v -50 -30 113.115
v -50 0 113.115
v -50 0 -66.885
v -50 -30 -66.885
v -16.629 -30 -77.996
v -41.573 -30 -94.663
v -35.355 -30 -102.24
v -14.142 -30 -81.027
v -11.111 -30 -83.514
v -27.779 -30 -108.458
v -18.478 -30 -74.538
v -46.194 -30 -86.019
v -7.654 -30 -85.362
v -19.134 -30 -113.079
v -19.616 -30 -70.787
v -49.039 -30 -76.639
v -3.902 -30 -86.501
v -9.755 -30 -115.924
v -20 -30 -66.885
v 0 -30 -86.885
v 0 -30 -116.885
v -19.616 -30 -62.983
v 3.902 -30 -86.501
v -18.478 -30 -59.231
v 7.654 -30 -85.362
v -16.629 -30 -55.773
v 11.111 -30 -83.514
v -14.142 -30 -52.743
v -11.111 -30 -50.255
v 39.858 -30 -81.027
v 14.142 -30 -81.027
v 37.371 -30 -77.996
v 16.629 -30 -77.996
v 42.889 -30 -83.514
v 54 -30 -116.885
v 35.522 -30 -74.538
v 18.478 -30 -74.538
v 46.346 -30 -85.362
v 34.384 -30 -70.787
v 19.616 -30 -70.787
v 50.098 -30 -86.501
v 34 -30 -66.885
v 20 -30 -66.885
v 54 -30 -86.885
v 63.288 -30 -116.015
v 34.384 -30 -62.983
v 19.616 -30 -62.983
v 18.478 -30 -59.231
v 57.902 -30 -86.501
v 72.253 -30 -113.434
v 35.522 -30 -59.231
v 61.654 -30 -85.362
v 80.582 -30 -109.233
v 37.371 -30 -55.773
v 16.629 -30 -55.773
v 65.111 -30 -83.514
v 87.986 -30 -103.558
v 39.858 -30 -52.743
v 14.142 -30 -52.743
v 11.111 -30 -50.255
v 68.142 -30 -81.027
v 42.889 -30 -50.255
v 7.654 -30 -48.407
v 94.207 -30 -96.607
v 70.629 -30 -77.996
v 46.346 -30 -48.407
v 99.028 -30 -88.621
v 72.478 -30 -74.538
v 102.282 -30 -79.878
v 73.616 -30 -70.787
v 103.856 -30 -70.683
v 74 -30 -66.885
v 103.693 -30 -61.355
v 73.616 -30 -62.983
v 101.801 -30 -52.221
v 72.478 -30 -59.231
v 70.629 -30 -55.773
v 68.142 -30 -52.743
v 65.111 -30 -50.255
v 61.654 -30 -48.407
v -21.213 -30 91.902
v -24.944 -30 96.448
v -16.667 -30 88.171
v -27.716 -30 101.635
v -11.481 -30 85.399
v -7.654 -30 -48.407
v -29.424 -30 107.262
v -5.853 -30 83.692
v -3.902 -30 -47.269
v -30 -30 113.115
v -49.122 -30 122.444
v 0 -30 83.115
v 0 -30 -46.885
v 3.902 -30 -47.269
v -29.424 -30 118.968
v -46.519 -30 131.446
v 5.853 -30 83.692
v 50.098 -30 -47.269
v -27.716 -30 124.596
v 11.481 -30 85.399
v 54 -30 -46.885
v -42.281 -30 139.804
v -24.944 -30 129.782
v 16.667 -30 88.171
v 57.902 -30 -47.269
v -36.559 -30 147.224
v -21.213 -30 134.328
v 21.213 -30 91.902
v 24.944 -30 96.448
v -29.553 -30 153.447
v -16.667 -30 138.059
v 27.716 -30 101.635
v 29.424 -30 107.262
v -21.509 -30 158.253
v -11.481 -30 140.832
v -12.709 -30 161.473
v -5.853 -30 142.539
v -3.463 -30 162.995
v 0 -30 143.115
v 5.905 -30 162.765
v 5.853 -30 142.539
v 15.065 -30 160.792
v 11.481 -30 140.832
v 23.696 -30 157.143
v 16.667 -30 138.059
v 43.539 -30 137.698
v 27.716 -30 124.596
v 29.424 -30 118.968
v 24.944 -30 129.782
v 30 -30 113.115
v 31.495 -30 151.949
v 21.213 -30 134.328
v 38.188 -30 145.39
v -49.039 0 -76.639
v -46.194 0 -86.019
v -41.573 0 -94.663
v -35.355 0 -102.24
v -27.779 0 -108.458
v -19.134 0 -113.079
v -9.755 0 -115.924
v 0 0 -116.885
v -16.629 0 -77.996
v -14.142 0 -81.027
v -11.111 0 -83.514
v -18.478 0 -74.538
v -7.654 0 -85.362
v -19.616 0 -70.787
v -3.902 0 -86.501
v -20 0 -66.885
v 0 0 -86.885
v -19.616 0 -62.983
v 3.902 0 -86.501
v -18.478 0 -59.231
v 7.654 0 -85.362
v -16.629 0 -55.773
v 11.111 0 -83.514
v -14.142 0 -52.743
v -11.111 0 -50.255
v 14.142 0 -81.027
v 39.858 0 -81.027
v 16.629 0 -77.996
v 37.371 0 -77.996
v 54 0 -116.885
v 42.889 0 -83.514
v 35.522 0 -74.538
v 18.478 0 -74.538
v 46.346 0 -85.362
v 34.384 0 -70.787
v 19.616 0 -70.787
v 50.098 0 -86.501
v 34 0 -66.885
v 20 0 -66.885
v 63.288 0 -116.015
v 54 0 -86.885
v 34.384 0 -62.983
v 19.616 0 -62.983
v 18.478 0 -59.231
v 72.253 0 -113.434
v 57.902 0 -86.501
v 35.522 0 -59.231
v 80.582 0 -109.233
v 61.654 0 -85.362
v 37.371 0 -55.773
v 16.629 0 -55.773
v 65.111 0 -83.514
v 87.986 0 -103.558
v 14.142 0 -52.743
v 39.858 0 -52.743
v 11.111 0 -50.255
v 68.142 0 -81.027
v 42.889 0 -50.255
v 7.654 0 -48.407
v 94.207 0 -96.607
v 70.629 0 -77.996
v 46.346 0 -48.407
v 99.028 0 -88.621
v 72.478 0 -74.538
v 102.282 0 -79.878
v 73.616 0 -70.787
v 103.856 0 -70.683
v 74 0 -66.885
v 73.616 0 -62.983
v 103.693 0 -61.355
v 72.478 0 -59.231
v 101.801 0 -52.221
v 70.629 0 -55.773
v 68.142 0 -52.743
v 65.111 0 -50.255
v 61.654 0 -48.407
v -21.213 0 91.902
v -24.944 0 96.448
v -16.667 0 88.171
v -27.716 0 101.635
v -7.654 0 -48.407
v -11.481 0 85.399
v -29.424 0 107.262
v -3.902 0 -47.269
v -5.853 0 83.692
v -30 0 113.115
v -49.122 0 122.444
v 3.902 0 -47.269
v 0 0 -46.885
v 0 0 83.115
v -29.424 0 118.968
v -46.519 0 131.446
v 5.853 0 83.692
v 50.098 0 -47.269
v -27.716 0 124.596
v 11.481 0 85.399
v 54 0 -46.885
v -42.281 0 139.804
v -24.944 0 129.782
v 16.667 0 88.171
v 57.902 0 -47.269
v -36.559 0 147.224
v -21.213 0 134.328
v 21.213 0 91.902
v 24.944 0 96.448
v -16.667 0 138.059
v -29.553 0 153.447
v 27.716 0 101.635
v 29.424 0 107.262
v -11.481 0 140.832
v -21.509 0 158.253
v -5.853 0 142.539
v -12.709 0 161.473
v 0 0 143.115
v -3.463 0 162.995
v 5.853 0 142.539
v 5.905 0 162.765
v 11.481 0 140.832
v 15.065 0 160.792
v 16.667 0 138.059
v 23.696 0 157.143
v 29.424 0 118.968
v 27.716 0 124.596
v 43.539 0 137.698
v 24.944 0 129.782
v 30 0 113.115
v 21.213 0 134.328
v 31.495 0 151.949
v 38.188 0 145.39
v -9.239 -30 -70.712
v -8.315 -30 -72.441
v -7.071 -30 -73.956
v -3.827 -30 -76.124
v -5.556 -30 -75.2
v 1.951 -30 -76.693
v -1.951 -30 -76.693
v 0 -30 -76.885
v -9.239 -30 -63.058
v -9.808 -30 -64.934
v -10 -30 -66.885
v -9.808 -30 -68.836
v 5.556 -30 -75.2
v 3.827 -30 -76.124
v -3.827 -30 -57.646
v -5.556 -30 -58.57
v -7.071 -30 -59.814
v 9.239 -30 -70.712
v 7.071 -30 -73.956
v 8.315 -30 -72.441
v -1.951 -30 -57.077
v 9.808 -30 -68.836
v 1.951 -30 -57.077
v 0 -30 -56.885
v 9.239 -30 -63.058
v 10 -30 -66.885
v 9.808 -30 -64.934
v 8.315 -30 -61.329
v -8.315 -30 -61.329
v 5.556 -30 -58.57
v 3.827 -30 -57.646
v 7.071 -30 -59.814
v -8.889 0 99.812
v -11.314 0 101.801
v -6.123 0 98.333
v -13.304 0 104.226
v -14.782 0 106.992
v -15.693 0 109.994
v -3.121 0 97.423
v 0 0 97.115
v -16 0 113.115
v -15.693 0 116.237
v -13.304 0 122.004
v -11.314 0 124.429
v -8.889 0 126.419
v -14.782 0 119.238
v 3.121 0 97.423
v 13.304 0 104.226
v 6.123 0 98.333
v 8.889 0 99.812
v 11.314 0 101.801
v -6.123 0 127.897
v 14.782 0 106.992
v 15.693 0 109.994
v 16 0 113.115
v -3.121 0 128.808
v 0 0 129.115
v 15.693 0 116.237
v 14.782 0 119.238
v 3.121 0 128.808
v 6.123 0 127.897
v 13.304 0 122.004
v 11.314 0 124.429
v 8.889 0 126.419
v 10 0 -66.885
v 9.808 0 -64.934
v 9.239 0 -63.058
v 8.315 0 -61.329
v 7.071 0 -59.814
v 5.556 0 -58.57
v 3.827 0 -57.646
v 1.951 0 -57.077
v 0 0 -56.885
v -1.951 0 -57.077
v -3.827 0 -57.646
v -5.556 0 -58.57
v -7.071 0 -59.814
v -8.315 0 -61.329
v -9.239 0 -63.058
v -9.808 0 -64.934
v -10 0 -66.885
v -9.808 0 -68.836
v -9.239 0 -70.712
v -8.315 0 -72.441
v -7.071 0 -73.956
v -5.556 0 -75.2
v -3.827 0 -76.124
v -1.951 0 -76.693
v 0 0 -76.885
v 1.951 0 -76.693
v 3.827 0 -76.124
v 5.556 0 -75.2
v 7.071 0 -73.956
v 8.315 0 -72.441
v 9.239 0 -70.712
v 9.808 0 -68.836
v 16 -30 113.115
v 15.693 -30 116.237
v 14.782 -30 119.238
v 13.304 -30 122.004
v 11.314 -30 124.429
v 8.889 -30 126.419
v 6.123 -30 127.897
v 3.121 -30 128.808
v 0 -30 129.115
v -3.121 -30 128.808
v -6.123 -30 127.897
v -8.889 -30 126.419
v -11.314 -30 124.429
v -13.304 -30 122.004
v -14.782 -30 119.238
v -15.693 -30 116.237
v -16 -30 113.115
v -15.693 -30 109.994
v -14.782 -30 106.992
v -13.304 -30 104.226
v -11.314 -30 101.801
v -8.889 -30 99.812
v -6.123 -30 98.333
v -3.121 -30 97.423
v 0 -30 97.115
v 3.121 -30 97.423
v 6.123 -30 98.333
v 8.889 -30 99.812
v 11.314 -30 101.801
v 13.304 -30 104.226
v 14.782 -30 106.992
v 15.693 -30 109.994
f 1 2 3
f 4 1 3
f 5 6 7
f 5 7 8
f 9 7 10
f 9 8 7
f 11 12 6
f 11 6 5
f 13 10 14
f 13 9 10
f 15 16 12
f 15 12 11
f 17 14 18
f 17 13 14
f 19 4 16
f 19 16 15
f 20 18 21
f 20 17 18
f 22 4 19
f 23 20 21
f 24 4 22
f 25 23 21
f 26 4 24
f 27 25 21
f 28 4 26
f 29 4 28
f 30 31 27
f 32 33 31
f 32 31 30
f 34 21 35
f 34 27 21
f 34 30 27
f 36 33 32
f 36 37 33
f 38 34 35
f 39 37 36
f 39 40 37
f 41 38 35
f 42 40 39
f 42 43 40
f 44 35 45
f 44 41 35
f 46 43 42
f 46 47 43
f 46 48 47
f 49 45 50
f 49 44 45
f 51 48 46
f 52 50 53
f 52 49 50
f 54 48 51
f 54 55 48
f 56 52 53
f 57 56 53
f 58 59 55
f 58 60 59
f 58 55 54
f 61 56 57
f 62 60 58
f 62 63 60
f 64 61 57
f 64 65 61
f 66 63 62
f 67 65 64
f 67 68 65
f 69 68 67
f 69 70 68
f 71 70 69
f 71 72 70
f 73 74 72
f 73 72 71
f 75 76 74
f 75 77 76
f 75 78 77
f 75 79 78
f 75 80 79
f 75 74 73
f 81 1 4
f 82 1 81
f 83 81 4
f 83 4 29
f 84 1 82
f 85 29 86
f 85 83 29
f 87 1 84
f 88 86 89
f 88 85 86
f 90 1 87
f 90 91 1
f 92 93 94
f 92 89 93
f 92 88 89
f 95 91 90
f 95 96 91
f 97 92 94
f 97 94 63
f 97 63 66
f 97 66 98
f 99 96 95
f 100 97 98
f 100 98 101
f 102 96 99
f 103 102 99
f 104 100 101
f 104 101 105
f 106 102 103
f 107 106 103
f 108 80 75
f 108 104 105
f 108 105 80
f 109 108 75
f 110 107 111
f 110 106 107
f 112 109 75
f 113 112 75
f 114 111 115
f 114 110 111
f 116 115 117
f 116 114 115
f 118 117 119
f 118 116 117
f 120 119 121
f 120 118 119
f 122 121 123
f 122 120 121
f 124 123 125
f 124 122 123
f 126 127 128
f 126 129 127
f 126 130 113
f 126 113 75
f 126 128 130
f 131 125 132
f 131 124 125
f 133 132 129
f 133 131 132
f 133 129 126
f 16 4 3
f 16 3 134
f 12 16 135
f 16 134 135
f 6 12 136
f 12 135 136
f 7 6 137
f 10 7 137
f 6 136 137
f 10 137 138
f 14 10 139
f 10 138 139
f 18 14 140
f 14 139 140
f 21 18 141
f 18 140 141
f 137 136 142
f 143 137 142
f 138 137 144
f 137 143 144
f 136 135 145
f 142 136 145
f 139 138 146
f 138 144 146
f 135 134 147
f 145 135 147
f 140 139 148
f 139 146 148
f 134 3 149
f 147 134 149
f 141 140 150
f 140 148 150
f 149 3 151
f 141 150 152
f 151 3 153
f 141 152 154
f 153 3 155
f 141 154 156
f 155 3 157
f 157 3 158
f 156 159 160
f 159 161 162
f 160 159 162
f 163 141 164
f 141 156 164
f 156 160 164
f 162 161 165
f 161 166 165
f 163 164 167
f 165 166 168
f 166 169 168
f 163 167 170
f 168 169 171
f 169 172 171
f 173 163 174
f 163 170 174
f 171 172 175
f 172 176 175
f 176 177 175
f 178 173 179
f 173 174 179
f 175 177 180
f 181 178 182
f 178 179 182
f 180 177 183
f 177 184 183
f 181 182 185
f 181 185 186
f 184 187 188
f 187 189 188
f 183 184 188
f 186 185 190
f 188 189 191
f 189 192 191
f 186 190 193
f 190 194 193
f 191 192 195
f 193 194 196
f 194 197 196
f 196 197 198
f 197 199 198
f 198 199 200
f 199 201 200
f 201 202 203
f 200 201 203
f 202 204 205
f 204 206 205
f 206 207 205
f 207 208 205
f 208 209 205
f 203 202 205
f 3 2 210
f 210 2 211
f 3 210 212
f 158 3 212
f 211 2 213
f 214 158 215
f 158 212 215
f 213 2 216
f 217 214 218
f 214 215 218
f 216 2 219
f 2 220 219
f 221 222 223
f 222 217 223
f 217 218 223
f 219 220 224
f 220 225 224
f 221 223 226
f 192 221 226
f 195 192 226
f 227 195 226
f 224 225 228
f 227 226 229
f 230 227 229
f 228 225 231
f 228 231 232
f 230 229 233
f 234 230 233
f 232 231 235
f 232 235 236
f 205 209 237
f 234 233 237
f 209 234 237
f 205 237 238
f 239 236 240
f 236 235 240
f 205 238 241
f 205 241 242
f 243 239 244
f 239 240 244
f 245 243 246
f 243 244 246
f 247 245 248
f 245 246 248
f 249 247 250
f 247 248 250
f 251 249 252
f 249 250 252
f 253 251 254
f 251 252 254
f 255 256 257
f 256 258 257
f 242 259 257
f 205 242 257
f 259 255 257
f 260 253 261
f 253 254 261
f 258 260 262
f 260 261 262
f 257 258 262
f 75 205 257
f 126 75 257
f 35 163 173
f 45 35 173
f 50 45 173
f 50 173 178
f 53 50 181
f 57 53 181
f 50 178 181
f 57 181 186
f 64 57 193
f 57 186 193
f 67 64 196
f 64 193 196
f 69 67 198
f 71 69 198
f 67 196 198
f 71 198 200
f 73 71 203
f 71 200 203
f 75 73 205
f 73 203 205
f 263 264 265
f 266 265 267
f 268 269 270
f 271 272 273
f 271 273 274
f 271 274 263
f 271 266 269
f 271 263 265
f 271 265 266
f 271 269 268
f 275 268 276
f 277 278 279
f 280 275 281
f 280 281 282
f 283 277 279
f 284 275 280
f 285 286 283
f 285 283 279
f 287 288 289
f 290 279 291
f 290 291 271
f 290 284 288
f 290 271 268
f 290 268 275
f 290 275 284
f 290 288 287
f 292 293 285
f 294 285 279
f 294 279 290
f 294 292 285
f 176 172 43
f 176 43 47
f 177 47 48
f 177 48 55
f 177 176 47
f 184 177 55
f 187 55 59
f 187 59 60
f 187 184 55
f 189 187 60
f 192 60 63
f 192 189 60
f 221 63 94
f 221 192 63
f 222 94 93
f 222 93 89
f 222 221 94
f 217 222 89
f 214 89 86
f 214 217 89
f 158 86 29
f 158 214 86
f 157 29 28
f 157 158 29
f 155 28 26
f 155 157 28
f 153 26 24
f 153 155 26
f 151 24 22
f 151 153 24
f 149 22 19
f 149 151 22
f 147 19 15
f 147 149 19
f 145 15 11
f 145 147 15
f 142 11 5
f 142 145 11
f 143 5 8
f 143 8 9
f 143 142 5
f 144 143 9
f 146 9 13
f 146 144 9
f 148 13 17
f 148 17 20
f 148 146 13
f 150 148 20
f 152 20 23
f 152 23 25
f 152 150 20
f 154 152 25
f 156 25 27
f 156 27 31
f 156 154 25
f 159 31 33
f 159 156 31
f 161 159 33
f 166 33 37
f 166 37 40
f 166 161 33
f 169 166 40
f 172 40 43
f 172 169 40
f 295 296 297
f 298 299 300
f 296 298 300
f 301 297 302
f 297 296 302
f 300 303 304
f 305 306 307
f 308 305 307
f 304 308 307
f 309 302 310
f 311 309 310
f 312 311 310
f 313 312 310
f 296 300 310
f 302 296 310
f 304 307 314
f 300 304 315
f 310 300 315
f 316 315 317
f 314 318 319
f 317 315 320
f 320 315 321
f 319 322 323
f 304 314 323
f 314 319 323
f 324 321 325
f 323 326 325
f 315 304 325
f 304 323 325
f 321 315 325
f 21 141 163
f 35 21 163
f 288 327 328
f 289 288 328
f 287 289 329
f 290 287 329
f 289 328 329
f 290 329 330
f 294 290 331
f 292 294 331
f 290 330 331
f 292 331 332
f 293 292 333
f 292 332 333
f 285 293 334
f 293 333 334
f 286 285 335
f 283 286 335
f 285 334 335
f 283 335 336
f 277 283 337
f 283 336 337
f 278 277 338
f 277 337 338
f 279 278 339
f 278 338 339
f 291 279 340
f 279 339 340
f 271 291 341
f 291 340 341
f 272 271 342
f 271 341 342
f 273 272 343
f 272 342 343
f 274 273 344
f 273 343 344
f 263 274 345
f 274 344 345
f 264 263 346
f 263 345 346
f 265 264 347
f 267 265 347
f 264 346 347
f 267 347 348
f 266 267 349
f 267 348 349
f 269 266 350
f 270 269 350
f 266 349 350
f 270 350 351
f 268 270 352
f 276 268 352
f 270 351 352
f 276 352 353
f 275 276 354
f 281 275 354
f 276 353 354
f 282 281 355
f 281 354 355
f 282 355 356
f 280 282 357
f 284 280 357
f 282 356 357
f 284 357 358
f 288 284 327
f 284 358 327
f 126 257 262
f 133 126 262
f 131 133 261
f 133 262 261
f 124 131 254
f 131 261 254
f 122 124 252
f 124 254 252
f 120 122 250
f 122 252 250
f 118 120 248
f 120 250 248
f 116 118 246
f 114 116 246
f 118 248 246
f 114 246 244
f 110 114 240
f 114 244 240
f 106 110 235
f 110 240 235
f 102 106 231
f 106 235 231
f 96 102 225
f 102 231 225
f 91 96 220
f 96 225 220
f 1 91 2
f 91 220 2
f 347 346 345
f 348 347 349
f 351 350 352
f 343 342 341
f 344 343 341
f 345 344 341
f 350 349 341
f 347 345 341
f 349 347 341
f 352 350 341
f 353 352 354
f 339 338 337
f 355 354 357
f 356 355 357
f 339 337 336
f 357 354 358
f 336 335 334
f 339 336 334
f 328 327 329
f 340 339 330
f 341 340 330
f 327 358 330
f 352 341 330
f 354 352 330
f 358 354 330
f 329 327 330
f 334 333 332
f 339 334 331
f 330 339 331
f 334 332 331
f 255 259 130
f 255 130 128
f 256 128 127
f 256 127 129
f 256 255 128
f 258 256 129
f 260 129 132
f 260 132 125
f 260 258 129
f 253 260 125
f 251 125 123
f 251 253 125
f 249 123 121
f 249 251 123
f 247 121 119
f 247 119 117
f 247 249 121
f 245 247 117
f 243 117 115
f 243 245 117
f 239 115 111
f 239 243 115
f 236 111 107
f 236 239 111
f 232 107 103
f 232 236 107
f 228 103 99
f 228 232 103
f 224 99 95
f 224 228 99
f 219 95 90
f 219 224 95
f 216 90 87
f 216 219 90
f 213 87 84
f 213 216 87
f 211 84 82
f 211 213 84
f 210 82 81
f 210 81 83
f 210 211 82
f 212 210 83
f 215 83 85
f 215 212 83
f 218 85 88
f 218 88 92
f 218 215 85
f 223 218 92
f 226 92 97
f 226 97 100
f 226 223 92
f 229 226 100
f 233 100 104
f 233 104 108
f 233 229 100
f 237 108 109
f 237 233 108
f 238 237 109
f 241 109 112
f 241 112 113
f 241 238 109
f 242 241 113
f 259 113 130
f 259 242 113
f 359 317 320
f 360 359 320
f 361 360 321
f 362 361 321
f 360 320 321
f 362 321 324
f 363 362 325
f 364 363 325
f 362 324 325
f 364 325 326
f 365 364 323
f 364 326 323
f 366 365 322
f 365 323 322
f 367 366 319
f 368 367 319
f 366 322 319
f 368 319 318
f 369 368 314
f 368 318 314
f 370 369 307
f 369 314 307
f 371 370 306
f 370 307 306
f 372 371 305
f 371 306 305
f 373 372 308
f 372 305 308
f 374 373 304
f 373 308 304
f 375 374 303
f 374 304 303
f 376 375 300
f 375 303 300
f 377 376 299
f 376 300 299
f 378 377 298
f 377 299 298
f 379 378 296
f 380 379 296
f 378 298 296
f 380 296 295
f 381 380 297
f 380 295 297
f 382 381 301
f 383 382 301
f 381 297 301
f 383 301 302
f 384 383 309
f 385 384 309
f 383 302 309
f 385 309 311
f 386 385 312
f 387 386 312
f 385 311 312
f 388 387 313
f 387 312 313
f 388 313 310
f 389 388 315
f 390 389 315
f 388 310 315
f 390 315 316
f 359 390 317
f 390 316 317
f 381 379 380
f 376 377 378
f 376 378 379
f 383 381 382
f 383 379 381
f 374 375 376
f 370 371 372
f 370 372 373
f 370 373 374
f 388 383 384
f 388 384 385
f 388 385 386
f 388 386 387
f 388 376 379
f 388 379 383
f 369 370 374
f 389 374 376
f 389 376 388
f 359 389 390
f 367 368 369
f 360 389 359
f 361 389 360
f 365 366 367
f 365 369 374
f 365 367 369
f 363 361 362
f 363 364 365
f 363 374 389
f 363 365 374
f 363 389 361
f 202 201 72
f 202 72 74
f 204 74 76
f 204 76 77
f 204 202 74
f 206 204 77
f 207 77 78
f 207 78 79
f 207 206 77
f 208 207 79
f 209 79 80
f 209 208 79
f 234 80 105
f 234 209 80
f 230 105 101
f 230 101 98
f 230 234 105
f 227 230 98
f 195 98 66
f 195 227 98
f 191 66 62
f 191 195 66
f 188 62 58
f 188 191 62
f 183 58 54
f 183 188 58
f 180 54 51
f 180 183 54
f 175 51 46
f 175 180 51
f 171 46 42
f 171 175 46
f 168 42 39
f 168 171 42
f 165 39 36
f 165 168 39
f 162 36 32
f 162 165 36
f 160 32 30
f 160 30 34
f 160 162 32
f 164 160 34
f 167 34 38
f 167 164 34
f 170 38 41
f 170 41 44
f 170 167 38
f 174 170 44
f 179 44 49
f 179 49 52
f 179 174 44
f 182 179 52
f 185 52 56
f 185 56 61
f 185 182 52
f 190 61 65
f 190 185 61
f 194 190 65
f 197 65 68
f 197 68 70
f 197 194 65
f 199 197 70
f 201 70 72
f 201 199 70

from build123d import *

# Parameters (mm, degrees)
F0_R     = 20
F0_R_2   = 30
F0_R_3   = 10
F0_R_4   = 16
F1_DEPTH = 30


with BuildPart() as f1:
    # F0 (on Front) → F1 (new body)
    with BuildSketch(Plane.XZ):
        with BuildLine():
            Line((-50, 113.115189), (-50, -66.884811))
            ThreePointArc((-50, -66.884811), (-35.355339, -102.24015), (0, -116.884811))
            Line((0, -116.884811), (54, -116.884811))
            ThreePointArc((54, -116.884811), (94.207006, -96.6068), (101.801289, -52.220677))
            Line((101.801289, -52.220677), (43.53934, 137.69823))
            ThreePointArc((43.53934, 137.69823), (-12.708914, 161.473058), (-50, 113.115189))
        make_face()
        with Locations((0, -66.884811)):
            Circle(F0_R, mode=Mode.SUBTRACT)
        with Locations((54, -66.884811)):
            Circle(F0_R, mode=Mode.SUBTRACT)
        with Locations((0, 113.115189)):
            Circle(F0_R_2, mode=Mode.SUBTRACT)
        with Locations((0, -66.884811)):
            Circle(F0_R_3)
        with Locations((0, 113.115189)):
            Circle(F0_R_4)
    extrude(amount=F1_DEPTH)


solid = f1.part
